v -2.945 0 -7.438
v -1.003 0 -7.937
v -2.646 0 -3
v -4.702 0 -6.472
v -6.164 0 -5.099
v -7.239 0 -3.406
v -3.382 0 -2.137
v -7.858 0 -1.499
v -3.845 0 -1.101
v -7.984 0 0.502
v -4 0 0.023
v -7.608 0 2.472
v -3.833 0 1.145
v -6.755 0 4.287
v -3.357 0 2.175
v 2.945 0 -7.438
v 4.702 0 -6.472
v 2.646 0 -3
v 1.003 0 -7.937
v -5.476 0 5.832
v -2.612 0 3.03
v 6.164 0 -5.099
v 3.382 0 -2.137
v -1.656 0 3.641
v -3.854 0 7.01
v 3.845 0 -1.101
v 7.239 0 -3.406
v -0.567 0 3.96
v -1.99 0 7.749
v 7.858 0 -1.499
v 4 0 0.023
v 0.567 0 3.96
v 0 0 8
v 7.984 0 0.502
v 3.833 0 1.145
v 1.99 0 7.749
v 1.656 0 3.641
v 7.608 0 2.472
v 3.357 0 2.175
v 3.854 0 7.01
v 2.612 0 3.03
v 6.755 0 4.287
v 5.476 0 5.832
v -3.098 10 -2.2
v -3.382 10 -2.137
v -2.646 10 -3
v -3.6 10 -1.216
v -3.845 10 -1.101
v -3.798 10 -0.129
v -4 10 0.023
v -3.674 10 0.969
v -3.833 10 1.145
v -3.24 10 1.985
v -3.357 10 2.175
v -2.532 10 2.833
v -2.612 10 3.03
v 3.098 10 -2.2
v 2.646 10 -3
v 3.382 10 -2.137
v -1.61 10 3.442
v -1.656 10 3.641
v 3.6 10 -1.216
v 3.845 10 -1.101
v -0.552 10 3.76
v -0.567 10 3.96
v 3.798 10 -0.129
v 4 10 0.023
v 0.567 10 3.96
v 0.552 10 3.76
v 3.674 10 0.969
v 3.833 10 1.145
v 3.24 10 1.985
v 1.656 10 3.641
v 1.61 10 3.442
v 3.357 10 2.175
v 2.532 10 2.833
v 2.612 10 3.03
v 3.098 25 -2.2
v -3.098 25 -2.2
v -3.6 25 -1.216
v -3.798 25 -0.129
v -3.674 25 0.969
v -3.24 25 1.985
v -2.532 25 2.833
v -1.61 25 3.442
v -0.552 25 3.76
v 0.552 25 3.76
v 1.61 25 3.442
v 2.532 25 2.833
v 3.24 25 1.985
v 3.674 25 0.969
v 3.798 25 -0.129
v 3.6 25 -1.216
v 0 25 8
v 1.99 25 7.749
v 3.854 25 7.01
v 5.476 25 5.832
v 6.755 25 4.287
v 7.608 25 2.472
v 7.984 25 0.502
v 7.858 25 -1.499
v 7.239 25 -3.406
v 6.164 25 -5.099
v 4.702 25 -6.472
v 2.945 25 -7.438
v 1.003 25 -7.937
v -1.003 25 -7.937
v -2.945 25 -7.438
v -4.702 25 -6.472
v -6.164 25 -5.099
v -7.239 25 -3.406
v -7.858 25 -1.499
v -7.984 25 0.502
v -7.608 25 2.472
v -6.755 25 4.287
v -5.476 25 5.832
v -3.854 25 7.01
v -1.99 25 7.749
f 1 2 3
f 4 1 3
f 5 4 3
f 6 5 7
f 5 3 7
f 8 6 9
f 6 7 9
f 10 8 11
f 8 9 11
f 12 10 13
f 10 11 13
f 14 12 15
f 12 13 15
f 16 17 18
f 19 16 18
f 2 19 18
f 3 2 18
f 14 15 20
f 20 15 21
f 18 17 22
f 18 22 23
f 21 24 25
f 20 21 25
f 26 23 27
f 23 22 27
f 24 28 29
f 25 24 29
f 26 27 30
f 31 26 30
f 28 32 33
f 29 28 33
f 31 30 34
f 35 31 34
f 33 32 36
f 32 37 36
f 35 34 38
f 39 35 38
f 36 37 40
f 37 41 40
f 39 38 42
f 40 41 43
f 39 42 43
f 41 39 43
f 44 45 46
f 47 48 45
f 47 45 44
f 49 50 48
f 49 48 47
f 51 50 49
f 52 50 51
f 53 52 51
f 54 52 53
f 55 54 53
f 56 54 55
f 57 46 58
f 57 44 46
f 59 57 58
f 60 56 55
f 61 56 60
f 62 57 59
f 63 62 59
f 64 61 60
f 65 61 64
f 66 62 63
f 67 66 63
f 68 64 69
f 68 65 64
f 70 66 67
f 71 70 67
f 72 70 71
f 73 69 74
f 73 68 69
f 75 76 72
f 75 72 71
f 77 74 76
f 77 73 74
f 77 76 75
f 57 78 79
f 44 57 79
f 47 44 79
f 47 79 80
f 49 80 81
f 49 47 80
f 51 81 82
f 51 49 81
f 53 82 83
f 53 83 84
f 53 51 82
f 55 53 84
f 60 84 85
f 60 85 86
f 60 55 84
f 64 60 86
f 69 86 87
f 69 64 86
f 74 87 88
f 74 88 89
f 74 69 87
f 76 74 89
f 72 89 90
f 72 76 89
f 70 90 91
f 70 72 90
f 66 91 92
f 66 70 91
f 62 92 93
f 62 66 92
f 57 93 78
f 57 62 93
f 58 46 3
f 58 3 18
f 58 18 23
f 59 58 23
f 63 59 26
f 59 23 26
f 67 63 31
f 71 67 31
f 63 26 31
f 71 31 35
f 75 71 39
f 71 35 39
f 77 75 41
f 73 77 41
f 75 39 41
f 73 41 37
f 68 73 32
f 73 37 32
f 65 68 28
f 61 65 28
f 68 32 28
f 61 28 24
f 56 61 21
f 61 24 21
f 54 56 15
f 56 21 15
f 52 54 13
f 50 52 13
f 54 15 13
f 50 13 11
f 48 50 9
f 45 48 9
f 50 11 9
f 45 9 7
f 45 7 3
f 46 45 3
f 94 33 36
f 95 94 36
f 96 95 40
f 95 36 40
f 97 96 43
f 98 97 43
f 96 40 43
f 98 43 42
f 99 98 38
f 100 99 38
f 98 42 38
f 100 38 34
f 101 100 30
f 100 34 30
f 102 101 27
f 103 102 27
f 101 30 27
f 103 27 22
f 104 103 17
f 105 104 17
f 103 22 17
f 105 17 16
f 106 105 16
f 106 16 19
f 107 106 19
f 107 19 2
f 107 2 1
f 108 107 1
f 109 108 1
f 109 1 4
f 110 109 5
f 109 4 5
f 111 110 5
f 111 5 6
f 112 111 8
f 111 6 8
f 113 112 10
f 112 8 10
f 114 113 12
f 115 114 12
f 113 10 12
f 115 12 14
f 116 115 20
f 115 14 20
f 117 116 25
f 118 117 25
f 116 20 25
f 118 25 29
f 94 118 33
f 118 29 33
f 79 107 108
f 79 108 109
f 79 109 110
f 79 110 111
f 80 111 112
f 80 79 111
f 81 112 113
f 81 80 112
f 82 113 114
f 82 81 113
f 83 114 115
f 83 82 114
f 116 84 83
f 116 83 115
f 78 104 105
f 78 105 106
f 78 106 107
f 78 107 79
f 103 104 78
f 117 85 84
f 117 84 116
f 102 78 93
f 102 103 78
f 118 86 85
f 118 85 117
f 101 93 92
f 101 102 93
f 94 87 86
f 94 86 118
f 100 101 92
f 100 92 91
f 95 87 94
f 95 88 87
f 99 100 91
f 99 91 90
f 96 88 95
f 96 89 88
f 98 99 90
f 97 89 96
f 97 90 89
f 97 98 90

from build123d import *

# Parameters (mm, degrees)
SKETCH1_R           = 8
BOSS_EXTRUDE1_DEPTH = 25
CUT_EXTRUDE1_DEPTH  = 10


with BuildPart() as part:
    # Sketch1 → Boss-Extrude1 (new body)
    with BuildSketch(Plane(origin=(0, 0, 0), x_dir=(1, 0, 0), z_dir=(0, 1, 0))):
        with Locations(Location((0, 0, 0), (0, 0, 270))):
            Circle(SKETCH1_R)
        with BuildLine():
            ThreePointArc((-3.098386677, 2.2), (0, -3.8), (3.098386677, 2.2))
            Line((3.098386677, 2.2), (-3.098386677, 2.2))
        make_face(mode=Mode.SUBTRACT)
    extrude(amount=BOSS_EXTRUDE1_DEPTH)

    # Sketch2 → Cut-Extrude1 (cut)
    with BuildSketch(Plane.XZ):
        with BuildLine():
            Line((-2.645751311, -3), (2.645751311, -3))
            ThreePointArc((2.645751311, -3), (0, 4), (-2.645751311, -3))
        make_face()
    extrude(amount=-CUT_EXTRUDE1_DEPTH, mode=Mode.SUBTRACT)


solid = part.part
